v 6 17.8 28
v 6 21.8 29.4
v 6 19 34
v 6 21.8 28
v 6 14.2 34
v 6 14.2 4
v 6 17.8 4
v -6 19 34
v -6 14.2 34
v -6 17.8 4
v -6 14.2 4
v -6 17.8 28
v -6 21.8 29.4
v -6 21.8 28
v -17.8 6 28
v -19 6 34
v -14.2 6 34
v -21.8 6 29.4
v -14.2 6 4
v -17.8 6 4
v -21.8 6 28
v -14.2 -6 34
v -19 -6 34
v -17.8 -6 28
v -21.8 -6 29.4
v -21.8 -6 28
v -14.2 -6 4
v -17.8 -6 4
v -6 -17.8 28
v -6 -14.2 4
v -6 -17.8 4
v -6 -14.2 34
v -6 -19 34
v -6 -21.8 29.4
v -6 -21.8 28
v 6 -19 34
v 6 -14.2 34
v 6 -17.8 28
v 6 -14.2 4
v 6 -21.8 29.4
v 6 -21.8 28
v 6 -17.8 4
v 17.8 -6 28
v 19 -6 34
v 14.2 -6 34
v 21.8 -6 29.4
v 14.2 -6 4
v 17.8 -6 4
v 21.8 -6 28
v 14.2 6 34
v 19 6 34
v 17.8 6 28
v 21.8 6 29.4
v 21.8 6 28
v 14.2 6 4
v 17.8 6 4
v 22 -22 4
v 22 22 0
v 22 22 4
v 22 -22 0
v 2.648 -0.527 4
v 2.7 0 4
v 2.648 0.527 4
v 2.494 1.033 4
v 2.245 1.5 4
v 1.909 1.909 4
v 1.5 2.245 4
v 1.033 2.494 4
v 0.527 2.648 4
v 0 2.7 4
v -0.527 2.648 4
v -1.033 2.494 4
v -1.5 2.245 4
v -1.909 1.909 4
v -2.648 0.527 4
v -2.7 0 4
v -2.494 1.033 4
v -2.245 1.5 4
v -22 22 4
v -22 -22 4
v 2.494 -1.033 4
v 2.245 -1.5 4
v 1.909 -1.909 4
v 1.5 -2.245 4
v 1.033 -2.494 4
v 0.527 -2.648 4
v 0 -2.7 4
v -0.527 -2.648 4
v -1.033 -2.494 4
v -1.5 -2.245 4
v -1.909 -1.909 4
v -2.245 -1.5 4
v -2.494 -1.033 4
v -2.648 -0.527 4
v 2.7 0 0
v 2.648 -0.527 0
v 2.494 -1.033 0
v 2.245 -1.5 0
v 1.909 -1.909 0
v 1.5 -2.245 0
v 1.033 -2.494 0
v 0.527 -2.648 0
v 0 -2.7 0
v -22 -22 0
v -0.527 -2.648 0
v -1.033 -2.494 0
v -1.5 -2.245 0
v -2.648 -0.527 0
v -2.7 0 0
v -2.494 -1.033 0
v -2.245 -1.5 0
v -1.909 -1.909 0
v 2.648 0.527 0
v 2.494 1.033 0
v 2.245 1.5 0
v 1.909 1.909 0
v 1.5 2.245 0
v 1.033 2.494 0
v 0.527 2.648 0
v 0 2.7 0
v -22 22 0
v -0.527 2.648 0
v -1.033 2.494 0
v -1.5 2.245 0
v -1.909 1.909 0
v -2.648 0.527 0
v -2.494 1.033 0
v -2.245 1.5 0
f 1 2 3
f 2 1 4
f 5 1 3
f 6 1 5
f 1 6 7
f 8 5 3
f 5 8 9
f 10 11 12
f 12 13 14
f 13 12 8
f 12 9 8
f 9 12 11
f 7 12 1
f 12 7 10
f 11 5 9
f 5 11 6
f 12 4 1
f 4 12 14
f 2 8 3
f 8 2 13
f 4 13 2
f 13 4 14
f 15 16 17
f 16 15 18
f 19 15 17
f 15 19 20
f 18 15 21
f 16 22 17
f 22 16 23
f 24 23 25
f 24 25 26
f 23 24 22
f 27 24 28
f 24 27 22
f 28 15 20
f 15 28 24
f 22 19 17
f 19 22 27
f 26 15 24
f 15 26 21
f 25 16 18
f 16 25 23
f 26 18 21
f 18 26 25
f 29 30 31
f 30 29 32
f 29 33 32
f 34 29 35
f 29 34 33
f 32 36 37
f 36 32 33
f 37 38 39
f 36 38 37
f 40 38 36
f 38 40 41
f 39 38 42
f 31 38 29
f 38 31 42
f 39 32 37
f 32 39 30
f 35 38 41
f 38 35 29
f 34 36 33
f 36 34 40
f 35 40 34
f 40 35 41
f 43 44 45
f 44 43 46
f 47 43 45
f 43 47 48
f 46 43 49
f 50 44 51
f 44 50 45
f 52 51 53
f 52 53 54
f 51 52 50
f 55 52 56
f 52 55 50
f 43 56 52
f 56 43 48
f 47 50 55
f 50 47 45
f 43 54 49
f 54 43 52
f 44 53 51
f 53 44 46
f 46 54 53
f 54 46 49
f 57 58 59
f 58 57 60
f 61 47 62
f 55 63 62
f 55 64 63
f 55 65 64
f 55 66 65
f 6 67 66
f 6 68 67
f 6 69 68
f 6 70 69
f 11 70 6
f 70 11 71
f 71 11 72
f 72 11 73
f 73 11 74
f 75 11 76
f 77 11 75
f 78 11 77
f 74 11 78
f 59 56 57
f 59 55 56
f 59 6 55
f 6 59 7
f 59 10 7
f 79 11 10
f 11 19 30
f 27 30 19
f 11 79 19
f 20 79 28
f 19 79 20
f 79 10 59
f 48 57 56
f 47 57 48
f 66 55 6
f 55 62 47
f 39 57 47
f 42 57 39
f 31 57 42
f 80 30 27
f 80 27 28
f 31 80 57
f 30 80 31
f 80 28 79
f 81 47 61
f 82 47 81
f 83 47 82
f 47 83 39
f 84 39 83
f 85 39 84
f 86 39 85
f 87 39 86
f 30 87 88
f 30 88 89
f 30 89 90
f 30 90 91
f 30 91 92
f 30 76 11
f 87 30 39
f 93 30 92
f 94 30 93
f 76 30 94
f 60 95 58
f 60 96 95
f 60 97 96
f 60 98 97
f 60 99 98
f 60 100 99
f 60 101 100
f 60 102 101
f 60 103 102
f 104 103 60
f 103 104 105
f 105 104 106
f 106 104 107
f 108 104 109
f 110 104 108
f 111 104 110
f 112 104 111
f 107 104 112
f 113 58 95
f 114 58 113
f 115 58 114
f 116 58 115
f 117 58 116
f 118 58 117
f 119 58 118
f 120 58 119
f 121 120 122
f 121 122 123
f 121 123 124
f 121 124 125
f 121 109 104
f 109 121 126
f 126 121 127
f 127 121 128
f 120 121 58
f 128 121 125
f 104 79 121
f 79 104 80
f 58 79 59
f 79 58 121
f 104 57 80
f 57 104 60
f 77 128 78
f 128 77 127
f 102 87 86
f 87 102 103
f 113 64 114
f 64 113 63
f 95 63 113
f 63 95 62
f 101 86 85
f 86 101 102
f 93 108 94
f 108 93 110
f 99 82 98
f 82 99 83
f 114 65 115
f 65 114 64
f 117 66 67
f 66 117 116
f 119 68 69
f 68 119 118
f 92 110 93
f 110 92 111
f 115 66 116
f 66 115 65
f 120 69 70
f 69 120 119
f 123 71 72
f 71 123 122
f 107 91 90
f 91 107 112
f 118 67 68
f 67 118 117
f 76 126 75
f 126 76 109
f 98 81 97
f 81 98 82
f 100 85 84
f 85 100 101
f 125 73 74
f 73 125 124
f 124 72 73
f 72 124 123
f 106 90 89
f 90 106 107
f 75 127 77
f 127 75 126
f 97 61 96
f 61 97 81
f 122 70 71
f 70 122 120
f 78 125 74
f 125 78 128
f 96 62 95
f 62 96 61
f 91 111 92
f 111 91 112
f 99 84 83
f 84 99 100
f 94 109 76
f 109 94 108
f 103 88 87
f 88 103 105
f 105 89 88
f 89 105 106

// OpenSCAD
$fn = 32;

// ----------------------------------------------------------------------
// Snap-fit latch: 4 arms, 30 mm tall, 4.2 mm undercut hooks
// ----------------------------------------------------------------------

// --- parameters (mm) ---
base_d = 44;              // base plate depth
base_h = 4;               // base plate thickness
span = 32;                // distance between opposite arms
arm_t = 3.6;              // arm thickness
arm_d = 12;               // arm width
height = 30;              // free arm length
head_len = 4.2;           // hook reach
head_h = 6;               // hook height
lead = 1.4;               // lead-in ramp thickness
bore_d = 5.4;             // base fixing bore
top_z = 34;               // height of the arm tips above the base

arms = 4;

difference() {
  union() {
    /* base plate, centred on the arm ring */
    translate([-22, -22, 0]) cube([base_d, base_d, base_h]);
    for (a = [0 : 360 / arms : 359]) rotate([0, 0, a]) {
    /* arm, sunk 0.5 mm into the base */
    translate([-arm_d / 2, span / 2 - arm_t / 2, base_h - 0.5]) cube([arm_d, arm_t, height + 0.5]);
    /* hook: a convex hull of a tall inner block and a thin outer lip
       gives a flat undercut below and a lead-in ramp on top */
    hull() {
      translate([-arm_d / 2, span / 2 + arm_t / 2 - 0.6, top_z - head_h]) cube([arm_d, lead + 0.4, head_h]);
      translate([-arm_d / 2, span / 2 + arm_t / 2 - 0.2, top_z - head_h]) cube([arm_d, head_len, lead]);
    }
    }
  }
  translate([0, 0, -2.5]) cylinder(h = base_h + 5, d = bore_d);
}
